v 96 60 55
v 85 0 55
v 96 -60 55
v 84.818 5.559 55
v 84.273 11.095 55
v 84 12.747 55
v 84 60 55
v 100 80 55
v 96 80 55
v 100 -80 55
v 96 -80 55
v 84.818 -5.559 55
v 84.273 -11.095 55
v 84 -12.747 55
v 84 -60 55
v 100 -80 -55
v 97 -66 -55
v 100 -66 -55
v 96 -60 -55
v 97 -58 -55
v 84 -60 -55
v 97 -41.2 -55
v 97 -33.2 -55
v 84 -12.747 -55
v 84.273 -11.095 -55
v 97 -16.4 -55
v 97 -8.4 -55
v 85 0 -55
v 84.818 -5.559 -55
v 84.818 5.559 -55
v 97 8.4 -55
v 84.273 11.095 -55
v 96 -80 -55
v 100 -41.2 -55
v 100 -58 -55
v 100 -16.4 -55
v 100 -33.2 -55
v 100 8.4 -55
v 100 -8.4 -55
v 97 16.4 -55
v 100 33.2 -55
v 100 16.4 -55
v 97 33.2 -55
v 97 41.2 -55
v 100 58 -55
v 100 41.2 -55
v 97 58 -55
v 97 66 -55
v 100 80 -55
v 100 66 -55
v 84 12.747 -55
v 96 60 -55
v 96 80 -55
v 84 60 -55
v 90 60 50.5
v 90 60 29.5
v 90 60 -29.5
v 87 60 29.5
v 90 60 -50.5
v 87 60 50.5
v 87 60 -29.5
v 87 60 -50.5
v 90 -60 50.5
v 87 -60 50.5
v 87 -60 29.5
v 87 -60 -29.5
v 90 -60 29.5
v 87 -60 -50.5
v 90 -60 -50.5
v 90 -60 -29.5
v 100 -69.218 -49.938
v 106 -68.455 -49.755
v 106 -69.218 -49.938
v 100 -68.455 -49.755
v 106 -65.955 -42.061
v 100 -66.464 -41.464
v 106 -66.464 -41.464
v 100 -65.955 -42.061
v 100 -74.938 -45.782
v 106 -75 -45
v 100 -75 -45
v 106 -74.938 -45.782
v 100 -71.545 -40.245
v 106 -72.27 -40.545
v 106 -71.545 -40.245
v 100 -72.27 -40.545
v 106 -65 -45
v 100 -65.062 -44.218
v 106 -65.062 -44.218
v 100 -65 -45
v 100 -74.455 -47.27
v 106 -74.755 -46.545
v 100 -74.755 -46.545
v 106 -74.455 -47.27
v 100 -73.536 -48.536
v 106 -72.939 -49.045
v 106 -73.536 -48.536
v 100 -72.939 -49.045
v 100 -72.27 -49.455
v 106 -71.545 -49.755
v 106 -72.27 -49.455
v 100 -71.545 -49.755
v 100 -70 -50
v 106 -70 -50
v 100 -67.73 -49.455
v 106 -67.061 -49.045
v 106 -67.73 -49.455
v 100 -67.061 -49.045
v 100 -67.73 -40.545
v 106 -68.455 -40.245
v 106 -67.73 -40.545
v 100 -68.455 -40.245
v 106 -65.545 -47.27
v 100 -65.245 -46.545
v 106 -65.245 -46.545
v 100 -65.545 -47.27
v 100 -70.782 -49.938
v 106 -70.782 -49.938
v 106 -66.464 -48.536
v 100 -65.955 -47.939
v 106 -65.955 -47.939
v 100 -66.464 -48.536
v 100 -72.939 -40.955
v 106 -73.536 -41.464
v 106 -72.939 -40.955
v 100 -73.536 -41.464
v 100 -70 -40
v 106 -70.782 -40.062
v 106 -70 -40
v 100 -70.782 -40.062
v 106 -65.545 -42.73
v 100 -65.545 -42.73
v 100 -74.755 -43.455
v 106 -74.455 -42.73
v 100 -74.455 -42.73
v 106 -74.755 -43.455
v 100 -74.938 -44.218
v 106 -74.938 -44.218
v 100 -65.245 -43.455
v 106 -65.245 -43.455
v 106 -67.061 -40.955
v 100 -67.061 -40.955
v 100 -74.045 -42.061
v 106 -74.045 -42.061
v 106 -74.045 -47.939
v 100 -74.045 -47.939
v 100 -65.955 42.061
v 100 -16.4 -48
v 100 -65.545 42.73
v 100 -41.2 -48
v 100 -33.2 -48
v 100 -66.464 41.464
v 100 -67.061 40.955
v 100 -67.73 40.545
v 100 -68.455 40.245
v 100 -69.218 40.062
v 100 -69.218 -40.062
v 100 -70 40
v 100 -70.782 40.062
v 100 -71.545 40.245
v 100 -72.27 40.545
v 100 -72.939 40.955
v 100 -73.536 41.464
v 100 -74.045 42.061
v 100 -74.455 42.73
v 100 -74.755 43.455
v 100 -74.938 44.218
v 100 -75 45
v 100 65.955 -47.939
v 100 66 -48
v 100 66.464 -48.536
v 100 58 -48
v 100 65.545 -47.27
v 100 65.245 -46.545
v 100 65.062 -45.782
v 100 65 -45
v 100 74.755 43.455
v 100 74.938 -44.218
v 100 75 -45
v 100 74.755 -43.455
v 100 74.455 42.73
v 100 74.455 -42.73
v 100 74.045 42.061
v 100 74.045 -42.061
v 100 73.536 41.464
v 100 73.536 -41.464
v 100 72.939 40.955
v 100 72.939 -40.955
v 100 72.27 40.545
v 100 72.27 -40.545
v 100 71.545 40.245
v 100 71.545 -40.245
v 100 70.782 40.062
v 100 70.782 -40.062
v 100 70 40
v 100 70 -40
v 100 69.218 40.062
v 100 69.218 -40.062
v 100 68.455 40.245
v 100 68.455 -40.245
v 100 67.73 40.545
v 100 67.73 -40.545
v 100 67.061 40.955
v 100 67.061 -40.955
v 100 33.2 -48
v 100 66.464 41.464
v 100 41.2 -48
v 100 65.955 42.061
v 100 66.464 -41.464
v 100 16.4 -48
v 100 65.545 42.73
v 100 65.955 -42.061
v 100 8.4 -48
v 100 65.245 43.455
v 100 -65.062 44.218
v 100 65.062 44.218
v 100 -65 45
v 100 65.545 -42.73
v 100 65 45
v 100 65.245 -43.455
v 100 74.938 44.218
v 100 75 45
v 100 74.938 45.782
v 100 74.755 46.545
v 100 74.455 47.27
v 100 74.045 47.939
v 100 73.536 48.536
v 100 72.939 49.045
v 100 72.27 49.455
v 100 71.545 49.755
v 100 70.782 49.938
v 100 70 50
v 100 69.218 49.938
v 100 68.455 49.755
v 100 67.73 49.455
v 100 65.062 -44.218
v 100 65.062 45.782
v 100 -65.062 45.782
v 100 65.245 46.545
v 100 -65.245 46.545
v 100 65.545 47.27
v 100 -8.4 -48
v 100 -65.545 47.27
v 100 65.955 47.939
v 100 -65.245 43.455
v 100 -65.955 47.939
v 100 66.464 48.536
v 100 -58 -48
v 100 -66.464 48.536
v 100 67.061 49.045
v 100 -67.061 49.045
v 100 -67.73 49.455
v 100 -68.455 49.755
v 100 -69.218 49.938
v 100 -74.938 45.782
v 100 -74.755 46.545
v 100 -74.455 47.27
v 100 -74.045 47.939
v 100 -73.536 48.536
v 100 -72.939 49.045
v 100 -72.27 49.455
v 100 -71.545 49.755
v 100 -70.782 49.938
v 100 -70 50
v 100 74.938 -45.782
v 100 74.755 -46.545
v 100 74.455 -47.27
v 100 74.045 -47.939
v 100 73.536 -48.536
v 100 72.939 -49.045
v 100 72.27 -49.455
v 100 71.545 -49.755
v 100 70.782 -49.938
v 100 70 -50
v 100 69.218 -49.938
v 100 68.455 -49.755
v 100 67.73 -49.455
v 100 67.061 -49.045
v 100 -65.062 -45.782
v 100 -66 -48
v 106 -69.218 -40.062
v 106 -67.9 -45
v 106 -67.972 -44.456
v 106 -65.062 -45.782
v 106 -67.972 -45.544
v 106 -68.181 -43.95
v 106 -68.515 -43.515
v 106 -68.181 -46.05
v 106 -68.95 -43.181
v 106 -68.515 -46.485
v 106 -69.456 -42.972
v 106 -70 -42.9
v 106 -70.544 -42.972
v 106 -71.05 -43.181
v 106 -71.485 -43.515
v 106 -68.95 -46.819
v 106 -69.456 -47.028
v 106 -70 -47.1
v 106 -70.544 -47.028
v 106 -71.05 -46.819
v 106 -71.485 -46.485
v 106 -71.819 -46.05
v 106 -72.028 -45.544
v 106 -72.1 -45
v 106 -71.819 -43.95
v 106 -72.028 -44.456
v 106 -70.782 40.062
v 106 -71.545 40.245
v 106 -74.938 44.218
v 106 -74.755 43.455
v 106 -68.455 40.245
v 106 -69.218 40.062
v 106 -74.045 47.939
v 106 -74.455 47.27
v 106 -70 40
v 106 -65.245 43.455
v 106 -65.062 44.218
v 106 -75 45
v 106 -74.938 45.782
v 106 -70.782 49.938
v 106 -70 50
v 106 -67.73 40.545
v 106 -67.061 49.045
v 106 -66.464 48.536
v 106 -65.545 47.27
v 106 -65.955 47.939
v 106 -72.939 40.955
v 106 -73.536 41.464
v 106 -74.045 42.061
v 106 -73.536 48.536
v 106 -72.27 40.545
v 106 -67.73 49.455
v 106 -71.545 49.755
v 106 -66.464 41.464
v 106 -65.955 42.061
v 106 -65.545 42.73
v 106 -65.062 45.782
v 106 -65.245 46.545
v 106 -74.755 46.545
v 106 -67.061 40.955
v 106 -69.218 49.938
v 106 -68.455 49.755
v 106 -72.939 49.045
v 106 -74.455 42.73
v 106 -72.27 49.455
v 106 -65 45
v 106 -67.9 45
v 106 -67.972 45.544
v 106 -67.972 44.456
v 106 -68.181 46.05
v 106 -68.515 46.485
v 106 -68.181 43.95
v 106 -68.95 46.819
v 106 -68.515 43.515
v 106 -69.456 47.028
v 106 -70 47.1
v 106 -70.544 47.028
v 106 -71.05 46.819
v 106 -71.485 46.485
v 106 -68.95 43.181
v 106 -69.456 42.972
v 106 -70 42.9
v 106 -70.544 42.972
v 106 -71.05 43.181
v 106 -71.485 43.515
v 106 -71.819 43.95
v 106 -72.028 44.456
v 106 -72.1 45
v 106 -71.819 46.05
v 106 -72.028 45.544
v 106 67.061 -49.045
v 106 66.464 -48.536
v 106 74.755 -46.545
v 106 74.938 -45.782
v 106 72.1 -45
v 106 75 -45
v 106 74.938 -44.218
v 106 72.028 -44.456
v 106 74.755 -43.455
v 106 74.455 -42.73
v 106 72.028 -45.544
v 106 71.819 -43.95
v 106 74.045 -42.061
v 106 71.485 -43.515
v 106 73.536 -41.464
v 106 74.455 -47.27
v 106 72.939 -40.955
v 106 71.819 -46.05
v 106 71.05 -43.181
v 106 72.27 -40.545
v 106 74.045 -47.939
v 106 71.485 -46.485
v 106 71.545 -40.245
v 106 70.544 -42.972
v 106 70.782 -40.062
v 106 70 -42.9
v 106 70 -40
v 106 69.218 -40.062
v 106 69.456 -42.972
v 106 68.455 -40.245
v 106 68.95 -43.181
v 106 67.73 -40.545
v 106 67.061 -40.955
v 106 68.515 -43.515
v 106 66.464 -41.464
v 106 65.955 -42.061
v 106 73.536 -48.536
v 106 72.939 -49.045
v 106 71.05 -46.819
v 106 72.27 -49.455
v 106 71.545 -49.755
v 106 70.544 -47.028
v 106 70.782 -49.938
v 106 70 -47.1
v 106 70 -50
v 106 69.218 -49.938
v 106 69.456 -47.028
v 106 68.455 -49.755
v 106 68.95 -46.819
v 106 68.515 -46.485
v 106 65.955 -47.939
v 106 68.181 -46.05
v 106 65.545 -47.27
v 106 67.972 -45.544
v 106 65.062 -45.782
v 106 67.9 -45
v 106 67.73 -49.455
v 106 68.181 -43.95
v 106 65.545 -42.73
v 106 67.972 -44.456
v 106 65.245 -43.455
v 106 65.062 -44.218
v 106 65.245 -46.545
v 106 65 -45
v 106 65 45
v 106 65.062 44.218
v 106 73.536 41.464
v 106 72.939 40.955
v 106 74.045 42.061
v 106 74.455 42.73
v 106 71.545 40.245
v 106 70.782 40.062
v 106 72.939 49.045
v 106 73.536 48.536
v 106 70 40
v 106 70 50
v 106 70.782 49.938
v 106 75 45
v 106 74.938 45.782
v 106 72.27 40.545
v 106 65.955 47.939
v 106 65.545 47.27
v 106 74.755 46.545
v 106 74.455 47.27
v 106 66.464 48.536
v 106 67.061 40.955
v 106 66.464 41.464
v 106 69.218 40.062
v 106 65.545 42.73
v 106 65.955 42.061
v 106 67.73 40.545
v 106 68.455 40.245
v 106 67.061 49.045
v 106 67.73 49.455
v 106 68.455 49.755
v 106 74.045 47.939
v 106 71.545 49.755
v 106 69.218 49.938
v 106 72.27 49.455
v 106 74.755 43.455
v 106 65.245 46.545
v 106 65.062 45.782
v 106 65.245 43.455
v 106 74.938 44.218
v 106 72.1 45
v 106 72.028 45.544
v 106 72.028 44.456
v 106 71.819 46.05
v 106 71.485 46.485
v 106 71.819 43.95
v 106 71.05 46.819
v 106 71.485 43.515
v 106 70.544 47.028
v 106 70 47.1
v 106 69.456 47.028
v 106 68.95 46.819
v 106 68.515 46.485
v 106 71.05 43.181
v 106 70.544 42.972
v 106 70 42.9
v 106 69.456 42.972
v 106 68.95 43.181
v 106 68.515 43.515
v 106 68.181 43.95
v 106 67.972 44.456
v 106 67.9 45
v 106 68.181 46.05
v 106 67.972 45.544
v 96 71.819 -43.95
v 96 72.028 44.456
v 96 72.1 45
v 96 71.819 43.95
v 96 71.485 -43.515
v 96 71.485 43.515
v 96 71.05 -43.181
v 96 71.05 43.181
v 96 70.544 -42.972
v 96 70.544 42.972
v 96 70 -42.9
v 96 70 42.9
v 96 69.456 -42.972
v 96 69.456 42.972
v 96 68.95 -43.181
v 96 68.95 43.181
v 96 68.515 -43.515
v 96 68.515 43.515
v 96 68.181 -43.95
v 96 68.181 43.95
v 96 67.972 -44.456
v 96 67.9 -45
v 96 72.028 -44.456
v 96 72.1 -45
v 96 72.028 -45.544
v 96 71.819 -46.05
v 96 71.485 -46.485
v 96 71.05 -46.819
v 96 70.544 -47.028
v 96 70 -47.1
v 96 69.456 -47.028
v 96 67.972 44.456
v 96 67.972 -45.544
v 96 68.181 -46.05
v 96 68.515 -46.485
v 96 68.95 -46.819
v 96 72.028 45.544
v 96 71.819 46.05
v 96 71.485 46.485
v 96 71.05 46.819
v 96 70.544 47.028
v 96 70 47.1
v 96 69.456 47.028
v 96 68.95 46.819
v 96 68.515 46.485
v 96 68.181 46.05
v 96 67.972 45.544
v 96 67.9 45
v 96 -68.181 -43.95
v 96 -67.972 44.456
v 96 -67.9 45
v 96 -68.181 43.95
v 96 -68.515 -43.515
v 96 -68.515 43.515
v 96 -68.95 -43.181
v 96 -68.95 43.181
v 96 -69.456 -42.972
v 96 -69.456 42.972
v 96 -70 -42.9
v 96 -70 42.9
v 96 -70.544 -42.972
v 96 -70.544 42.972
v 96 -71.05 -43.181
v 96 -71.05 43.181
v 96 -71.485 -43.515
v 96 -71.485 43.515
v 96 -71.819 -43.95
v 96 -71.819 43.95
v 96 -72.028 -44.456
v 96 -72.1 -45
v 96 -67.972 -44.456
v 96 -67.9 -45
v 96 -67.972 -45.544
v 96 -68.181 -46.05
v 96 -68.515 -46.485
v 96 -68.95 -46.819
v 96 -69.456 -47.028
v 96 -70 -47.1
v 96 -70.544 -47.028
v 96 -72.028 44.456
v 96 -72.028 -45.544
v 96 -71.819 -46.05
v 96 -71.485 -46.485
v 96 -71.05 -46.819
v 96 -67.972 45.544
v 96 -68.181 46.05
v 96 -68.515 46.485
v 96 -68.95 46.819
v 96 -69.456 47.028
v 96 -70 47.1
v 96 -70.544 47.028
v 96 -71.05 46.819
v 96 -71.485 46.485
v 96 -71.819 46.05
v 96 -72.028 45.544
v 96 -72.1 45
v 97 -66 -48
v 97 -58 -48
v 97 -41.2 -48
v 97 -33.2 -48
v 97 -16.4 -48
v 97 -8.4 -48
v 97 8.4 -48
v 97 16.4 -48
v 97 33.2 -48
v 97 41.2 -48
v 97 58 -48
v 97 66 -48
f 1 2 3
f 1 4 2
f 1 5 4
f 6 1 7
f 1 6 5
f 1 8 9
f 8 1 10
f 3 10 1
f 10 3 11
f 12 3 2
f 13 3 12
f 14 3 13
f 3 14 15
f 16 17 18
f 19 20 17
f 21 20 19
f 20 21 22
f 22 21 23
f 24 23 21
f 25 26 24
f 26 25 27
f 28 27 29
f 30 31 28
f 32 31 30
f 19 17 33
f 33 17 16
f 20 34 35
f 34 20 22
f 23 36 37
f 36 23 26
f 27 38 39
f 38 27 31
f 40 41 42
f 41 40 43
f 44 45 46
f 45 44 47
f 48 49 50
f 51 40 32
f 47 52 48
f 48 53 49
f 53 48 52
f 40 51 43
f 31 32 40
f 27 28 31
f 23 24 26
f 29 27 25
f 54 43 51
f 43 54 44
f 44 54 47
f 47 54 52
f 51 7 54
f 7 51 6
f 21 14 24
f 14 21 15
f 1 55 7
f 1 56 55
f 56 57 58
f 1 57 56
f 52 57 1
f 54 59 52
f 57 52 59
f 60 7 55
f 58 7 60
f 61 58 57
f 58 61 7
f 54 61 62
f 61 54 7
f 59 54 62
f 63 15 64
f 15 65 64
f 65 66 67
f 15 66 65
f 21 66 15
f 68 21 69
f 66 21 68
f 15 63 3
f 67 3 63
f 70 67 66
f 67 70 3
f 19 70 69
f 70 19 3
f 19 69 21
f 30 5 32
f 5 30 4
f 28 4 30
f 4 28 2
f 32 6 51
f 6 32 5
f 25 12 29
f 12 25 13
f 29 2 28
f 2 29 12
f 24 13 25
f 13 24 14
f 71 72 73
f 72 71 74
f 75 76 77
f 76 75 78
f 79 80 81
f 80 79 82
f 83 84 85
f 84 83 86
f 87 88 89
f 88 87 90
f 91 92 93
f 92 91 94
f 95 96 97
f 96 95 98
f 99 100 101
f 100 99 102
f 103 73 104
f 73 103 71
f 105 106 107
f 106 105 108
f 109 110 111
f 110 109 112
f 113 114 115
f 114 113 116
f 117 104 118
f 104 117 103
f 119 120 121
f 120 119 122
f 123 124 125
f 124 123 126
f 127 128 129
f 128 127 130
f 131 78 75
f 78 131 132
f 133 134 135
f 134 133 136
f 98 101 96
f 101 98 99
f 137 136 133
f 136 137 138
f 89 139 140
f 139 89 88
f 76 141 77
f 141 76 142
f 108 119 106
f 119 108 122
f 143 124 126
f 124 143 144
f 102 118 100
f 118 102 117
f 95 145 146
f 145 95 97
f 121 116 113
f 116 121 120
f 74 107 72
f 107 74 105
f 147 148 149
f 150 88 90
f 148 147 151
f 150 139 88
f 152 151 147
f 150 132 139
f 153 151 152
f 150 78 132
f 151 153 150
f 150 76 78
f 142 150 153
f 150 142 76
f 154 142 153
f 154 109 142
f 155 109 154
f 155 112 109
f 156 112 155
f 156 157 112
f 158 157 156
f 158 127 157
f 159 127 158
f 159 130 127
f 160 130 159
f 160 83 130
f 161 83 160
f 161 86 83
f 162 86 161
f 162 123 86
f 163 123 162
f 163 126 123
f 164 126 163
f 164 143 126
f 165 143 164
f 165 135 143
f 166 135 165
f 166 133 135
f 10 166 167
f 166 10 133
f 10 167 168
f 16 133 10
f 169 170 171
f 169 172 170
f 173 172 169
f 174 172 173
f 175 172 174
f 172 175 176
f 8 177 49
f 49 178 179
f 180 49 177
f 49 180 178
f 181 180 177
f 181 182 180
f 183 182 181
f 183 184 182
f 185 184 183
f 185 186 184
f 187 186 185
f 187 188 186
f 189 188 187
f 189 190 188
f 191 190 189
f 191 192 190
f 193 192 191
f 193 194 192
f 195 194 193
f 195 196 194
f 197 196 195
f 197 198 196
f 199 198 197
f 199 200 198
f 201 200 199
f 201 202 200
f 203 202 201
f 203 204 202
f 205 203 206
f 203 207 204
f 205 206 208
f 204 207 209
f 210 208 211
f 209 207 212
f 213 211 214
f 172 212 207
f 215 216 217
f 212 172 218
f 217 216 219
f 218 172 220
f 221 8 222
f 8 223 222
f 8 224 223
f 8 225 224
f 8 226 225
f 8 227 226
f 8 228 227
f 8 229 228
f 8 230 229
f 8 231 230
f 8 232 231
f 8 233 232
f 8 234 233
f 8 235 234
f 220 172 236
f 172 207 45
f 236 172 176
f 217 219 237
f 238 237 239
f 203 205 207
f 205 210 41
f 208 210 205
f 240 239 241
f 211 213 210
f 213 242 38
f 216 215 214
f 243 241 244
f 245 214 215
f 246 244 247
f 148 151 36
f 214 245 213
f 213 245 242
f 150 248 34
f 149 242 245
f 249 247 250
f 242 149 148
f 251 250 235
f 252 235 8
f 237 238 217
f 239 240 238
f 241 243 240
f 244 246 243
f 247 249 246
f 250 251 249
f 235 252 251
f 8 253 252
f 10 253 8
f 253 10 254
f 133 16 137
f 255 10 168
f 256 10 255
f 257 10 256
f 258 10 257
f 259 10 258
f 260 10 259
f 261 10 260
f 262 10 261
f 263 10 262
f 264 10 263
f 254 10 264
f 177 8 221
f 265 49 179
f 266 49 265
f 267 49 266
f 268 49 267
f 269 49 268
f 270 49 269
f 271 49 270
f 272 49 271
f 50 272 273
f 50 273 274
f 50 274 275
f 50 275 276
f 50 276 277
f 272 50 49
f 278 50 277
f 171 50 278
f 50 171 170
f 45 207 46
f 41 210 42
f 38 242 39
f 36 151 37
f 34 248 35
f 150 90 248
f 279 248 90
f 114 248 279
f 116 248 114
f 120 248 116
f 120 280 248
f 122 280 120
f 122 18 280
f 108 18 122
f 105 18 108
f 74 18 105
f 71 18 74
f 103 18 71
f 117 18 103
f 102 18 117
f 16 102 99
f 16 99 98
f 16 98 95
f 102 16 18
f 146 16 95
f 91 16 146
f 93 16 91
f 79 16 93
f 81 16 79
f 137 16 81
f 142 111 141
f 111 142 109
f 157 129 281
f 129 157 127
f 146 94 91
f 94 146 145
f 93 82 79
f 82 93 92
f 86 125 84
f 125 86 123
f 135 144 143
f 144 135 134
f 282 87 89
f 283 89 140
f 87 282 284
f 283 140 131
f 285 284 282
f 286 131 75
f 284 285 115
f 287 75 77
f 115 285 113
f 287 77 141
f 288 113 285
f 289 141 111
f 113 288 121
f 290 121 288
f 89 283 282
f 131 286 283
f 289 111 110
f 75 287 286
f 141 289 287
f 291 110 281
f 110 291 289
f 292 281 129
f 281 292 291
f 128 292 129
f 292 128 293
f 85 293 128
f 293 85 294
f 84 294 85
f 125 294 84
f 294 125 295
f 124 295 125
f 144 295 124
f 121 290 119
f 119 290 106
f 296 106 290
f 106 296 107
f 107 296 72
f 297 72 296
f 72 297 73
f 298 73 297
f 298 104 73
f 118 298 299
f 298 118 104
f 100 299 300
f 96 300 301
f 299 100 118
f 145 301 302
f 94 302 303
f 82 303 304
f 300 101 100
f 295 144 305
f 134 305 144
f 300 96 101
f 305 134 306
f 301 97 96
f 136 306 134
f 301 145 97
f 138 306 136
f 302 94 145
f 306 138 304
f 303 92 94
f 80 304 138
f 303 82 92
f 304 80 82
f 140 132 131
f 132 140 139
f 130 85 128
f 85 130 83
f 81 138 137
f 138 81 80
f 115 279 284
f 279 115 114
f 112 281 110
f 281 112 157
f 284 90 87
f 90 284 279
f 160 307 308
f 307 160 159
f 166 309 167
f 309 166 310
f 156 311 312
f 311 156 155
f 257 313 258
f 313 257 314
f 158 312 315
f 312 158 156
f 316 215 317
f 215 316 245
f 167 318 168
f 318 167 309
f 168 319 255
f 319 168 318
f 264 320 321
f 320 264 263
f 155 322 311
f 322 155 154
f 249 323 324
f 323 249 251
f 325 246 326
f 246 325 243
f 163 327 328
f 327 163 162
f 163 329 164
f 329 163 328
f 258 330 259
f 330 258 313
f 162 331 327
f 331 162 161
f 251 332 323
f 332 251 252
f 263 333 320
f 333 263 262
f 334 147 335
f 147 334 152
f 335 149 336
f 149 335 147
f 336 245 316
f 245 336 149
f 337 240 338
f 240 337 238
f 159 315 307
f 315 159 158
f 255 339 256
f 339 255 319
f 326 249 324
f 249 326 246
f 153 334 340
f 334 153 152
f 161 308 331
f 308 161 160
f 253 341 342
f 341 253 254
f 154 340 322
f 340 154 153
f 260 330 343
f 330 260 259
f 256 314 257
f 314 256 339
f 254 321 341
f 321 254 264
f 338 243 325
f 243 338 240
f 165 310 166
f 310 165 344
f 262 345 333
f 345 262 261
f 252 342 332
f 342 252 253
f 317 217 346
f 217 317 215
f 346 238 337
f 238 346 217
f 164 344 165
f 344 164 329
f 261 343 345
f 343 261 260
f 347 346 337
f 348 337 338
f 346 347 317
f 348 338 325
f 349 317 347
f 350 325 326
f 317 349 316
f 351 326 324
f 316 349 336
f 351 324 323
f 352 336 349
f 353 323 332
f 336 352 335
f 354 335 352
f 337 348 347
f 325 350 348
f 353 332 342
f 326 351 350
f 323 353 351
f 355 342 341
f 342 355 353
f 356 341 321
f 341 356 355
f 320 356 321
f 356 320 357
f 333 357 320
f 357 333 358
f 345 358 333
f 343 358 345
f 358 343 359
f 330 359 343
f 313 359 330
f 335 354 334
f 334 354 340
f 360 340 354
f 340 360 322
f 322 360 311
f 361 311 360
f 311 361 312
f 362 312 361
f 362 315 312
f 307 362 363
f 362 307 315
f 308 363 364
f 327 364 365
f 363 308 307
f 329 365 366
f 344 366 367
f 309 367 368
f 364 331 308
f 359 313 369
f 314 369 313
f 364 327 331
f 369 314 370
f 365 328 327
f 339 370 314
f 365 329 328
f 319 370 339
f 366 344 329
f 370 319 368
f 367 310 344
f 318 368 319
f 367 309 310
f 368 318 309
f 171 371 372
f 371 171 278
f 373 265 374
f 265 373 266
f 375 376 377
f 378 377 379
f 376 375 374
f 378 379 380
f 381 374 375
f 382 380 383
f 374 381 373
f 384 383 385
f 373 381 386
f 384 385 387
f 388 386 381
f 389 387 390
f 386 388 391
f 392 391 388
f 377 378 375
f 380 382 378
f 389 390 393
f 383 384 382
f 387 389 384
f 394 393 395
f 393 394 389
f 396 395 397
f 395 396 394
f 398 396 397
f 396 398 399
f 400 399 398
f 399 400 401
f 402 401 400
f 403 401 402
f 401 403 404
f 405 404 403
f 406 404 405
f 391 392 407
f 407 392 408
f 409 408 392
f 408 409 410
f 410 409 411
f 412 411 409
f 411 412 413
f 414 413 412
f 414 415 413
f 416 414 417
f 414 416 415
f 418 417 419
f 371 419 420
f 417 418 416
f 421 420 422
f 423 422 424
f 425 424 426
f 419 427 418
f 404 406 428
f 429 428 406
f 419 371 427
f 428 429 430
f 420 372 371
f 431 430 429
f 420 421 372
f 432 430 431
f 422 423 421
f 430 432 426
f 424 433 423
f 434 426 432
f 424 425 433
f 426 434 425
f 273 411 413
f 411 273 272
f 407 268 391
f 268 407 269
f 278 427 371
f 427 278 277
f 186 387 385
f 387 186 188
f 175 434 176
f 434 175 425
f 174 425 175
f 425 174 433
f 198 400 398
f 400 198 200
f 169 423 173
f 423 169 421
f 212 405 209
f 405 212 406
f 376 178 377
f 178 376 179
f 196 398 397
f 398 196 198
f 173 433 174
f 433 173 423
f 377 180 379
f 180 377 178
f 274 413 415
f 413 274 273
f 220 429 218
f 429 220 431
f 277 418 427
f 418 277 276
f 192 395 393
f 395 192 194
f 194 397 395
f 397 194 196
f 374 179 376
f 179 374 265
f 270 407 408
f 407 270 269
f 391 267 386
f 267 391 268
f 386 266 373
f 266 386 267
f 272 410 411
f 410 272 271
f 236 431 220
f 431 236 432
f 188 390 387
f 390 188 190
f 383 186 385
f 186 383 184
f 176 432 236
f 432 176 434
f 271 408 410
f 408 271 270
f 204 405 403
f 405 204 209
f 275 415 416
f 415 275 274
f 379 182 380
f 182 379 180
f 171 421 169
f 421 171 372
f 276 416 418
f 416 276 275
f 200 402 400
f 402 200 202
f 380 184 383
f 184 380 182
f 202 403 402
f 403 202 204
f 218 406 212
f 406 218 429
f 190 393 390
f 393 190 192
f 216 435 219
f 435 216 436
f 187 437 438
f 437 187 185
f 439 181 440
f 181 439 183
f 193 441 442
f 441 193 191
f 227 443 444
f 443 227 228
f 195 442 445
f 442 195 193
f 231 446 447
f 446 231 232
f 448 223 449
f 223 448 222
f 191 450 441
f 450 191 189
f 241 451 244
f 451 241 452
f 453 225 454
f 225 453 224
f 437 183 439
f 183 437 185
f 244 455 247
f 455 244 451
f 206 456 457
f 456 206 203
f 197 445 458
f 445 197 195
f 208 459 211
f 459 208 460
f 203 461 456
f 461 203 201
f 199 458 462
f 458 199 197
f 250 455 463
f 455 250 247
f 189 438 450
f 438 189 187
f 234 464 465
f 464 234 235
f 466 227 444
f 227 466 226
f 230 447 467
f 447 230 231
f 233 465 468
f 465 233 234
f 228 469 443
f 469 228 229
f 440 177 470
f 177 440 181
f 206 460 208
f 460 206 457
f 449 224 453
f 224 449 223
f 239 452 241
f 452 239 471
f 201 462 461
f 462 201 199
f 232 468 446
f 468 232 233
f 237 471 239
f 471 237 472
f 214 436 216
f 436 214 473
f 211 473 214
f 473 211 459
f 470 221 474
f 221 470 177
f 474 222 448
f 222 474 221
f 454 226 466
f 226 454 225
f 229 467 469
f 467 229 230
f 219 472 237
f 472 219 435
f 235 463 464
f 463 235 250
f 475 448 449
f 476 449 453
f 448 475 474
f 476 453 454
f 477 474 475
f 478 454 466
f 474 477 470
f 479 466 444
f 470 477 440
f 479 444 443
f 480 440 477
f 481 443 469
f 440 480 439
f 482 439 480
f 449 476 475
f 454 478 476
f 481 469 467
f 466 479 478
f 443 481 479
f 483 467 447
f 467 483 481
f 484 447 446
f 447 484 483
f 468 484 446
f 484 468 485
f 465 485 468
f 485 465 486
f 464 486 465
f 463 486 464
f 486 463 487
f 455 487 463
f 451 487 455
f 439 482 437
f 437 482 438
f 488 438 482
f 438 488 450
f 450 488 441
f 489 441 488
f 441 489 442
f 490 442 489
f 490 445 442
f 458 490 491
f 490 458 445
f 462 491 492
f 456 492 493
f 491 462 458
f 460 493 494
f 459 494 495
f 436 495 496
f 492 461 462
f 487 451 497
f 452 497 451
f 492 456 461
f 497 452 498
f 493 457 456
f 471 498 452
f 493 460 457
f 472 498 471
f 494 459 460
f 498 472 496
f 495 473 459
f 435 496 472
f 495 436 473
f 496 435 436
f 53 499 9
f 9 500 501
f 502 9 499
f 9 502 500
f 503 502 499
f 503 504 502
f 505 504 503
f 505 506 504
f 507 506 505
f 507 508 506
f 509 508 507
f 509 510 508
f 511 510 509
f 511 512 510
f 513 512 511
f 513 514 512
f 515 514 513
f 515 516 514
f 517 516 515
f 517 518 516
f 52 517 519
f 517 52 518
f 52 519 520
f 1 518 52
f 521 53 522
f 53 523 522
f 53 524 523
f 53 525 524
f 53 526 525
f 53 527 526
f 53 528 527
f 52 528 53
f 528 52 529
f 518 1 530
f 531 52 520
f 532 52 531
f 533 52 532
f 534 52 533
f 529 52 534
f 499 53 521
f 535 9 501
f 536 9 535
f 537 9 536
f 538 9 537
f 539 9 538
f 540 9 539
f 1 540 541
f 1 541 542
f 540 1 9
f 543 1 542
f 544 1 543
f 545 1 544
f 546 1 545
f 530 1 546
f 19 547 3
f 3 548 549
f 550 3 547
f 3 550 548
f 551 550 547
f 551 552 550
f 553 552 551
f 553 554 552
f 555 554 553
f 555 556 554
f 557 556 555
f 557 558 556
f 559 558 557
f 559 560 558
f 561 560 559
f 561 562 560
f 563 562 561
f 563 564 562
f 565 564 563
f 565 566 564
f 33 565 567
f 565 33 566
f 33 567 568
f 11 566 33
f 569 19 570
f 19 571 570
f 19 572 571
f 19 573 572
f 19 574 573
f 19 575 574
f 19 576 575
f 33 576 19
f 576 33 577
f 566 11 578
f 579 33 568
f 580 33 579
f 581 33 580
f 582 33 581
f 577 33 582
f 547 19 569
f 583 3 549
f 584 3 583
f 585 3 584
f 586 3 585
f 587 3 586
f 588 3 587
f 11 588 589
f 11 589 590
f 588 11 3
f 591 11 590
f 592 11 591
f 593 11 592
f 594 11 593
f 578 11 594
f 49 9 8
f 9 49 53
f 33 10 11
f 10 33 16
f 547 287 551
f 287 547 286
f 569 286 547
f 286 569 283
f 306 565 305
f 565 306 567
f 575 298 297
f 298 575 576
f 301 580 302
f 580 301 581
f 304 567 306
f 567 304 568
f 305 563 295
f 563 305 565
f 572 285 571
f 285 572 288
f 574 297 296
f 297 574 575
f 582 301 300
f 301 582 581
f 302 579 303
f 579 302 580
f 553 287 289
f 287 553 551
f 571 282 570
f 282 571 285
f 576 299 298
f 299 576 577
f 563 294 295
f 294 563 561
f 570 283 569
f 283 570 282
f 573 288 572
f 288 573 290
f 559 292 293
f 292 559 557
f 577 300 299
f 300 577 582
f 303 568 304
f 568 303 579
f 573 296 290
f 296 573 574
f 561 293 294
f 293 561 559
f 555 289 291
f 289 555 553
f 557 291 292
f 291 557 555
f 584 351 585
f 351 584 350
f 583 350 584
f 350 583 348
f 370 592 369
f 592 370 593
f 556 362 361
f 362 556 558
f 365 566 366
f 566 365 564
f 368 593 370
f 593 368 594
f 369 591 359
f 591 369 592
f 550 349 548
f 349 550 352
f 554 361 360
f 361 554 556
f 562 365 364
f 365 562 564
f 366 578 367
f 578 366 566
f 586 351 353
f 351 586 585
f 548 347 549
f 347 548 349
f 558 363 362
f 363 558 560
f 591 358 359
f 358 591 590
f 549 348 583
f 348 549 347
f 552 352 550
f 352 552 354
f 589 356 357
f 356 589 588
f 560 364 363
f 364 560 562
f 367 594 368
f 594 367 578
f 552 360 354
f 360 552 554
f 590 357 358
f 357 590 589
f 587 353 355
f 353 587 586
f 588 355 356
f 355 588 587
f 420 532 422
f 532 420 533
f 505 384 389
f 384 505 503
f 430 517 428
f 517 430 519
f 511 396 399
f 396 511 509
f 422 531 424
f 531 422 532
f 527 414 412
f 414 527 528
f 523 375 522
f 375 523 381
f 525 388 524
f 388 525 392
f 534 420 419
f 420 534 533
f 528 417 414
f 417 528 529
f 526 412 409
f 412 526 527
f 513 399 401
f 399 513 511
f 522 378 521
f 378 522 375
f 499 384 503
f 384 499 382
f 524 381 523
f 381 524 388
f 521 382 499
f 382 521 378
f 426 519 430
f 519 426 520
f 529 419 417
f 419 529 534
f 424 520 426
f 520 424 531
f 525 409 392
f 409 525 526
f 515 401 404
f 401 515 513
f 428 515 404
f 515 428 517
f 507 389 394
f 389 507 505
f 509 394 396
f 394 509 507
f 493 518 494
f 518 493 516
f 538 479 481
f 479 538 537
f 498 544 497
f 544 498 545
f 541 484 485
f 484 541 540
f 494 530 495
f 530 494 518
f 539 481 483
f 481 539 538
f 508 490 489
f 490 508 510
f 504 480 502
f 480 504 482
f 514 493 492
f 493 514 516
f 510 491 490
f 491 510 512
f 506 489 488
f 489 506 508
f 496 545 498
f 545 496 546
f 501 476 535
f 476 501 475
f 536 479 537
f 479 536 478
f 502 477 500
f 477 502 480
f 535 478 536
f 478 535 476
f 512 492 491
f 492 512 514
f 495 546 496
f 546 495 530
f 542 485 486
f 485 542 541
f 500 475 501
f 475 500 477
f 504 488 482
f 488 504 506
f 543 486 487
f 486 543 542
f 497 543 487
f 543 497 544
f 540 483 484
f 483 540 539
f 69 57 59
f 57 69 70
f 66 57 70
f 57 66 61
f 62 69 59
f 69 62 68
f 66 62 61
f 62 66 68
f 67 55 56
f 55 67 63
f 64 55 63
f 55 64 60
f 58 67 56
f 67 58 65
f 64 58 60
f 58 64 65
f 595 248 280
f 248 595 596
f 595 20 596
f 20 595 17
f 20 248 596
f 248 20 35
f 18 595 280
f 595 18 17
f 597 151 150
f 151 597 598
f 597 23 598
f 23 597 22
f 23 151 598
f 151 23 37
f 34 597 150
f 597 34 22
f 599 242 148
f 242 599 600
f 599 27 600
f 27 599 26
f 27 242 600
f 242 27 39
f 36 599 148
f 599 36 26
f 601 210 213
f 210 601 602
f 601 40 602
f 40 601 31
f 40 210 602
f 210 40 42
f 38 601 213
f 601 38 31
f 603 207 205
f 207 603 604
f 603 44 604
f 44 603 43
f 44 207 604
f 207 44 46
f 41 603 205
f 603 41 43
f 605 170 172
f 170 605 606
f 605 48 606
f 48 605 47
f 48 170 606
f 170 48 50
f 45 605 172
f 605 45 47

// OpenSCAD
// file: phytohydra_params.scad
// PhytoHydra v1 - shared parameters (all dimensions in mm)
// Open any part file in OpenSCAD (free, openscad.org), press F6, then File > Export > STL.
trunk_d      = 170;   // measure girth with a tape: trunk_d = girth / 3.1416
trunk_r      = trunk_d / 2;
wall         = 2.4;   // printed wall thickness (PA12, ASA or PETG)
strap_w      = 20;    // TPU strap / stainless band width
strap_t      = 2.2;
$fn          = 96;
// main file
// Edge Hub mounting saddle: curved back for the trunk, 4 bosses for a
// 160 x 110 mm IP67 polycarbonate box, two slots for 20 mm stainless band clamps.
include <phytohydra_params.scad>;
sad_w = 120; sad_h = 110; sad_t = 12;
box_w = 160; box_h = 110; boss_pitch_w = 140; boss_pitch_h = 90;
difference() {
    union() {
        difference() {
            translate([trunk_r - 1, -sad_w/2, -sad_h/2]) cube([sad_t + 1, sad_w, sad_h]);
            cylinder(r = trunk_r, h = sad_h + 2, center = true);
        }
        // flat mounting plate
        translate([trunk_r + sad_t - 1, -box_w/2, -box_h/2]) cube([4, box_w, box_h]);
        for (y = [-boss_pitch_w/2, boss_pitch_w/2], z = [-boss_pitch_h/2, boss_pitch_h/2])
            translate([trunk_r + sad_t + 3, y, z]) rotate([0, 90, 0]) cylinder(d = 10, h = 6, $fn = 40);
    }
    for (y = [-boss_pitch_w/2, boss_pitch_w/2], z = [-boss_pitch_h/2, boss_pitch_h/2])
        translate([trunk_r + sad_t - 2, y, z]) rotate([0, 90, 0]) cylinder(d = 4.2, h = 12, $fn = 24); // M4 heat-set insert
    for (z = [-40, 40]) translate([trunk_r + 2, -sad_w/2 - 1, z - strap_w/2 - 0.5]) cube([3, sad_w + 2, strap_w + 1]);
    // cable comb notches at the bottom edge
    for (i = [0:5]) translate([trunk_r + sad_t, -62 + i * 24.8 - 4, -box_h/2 - 1]) cube([6, 8, 8]);
}
